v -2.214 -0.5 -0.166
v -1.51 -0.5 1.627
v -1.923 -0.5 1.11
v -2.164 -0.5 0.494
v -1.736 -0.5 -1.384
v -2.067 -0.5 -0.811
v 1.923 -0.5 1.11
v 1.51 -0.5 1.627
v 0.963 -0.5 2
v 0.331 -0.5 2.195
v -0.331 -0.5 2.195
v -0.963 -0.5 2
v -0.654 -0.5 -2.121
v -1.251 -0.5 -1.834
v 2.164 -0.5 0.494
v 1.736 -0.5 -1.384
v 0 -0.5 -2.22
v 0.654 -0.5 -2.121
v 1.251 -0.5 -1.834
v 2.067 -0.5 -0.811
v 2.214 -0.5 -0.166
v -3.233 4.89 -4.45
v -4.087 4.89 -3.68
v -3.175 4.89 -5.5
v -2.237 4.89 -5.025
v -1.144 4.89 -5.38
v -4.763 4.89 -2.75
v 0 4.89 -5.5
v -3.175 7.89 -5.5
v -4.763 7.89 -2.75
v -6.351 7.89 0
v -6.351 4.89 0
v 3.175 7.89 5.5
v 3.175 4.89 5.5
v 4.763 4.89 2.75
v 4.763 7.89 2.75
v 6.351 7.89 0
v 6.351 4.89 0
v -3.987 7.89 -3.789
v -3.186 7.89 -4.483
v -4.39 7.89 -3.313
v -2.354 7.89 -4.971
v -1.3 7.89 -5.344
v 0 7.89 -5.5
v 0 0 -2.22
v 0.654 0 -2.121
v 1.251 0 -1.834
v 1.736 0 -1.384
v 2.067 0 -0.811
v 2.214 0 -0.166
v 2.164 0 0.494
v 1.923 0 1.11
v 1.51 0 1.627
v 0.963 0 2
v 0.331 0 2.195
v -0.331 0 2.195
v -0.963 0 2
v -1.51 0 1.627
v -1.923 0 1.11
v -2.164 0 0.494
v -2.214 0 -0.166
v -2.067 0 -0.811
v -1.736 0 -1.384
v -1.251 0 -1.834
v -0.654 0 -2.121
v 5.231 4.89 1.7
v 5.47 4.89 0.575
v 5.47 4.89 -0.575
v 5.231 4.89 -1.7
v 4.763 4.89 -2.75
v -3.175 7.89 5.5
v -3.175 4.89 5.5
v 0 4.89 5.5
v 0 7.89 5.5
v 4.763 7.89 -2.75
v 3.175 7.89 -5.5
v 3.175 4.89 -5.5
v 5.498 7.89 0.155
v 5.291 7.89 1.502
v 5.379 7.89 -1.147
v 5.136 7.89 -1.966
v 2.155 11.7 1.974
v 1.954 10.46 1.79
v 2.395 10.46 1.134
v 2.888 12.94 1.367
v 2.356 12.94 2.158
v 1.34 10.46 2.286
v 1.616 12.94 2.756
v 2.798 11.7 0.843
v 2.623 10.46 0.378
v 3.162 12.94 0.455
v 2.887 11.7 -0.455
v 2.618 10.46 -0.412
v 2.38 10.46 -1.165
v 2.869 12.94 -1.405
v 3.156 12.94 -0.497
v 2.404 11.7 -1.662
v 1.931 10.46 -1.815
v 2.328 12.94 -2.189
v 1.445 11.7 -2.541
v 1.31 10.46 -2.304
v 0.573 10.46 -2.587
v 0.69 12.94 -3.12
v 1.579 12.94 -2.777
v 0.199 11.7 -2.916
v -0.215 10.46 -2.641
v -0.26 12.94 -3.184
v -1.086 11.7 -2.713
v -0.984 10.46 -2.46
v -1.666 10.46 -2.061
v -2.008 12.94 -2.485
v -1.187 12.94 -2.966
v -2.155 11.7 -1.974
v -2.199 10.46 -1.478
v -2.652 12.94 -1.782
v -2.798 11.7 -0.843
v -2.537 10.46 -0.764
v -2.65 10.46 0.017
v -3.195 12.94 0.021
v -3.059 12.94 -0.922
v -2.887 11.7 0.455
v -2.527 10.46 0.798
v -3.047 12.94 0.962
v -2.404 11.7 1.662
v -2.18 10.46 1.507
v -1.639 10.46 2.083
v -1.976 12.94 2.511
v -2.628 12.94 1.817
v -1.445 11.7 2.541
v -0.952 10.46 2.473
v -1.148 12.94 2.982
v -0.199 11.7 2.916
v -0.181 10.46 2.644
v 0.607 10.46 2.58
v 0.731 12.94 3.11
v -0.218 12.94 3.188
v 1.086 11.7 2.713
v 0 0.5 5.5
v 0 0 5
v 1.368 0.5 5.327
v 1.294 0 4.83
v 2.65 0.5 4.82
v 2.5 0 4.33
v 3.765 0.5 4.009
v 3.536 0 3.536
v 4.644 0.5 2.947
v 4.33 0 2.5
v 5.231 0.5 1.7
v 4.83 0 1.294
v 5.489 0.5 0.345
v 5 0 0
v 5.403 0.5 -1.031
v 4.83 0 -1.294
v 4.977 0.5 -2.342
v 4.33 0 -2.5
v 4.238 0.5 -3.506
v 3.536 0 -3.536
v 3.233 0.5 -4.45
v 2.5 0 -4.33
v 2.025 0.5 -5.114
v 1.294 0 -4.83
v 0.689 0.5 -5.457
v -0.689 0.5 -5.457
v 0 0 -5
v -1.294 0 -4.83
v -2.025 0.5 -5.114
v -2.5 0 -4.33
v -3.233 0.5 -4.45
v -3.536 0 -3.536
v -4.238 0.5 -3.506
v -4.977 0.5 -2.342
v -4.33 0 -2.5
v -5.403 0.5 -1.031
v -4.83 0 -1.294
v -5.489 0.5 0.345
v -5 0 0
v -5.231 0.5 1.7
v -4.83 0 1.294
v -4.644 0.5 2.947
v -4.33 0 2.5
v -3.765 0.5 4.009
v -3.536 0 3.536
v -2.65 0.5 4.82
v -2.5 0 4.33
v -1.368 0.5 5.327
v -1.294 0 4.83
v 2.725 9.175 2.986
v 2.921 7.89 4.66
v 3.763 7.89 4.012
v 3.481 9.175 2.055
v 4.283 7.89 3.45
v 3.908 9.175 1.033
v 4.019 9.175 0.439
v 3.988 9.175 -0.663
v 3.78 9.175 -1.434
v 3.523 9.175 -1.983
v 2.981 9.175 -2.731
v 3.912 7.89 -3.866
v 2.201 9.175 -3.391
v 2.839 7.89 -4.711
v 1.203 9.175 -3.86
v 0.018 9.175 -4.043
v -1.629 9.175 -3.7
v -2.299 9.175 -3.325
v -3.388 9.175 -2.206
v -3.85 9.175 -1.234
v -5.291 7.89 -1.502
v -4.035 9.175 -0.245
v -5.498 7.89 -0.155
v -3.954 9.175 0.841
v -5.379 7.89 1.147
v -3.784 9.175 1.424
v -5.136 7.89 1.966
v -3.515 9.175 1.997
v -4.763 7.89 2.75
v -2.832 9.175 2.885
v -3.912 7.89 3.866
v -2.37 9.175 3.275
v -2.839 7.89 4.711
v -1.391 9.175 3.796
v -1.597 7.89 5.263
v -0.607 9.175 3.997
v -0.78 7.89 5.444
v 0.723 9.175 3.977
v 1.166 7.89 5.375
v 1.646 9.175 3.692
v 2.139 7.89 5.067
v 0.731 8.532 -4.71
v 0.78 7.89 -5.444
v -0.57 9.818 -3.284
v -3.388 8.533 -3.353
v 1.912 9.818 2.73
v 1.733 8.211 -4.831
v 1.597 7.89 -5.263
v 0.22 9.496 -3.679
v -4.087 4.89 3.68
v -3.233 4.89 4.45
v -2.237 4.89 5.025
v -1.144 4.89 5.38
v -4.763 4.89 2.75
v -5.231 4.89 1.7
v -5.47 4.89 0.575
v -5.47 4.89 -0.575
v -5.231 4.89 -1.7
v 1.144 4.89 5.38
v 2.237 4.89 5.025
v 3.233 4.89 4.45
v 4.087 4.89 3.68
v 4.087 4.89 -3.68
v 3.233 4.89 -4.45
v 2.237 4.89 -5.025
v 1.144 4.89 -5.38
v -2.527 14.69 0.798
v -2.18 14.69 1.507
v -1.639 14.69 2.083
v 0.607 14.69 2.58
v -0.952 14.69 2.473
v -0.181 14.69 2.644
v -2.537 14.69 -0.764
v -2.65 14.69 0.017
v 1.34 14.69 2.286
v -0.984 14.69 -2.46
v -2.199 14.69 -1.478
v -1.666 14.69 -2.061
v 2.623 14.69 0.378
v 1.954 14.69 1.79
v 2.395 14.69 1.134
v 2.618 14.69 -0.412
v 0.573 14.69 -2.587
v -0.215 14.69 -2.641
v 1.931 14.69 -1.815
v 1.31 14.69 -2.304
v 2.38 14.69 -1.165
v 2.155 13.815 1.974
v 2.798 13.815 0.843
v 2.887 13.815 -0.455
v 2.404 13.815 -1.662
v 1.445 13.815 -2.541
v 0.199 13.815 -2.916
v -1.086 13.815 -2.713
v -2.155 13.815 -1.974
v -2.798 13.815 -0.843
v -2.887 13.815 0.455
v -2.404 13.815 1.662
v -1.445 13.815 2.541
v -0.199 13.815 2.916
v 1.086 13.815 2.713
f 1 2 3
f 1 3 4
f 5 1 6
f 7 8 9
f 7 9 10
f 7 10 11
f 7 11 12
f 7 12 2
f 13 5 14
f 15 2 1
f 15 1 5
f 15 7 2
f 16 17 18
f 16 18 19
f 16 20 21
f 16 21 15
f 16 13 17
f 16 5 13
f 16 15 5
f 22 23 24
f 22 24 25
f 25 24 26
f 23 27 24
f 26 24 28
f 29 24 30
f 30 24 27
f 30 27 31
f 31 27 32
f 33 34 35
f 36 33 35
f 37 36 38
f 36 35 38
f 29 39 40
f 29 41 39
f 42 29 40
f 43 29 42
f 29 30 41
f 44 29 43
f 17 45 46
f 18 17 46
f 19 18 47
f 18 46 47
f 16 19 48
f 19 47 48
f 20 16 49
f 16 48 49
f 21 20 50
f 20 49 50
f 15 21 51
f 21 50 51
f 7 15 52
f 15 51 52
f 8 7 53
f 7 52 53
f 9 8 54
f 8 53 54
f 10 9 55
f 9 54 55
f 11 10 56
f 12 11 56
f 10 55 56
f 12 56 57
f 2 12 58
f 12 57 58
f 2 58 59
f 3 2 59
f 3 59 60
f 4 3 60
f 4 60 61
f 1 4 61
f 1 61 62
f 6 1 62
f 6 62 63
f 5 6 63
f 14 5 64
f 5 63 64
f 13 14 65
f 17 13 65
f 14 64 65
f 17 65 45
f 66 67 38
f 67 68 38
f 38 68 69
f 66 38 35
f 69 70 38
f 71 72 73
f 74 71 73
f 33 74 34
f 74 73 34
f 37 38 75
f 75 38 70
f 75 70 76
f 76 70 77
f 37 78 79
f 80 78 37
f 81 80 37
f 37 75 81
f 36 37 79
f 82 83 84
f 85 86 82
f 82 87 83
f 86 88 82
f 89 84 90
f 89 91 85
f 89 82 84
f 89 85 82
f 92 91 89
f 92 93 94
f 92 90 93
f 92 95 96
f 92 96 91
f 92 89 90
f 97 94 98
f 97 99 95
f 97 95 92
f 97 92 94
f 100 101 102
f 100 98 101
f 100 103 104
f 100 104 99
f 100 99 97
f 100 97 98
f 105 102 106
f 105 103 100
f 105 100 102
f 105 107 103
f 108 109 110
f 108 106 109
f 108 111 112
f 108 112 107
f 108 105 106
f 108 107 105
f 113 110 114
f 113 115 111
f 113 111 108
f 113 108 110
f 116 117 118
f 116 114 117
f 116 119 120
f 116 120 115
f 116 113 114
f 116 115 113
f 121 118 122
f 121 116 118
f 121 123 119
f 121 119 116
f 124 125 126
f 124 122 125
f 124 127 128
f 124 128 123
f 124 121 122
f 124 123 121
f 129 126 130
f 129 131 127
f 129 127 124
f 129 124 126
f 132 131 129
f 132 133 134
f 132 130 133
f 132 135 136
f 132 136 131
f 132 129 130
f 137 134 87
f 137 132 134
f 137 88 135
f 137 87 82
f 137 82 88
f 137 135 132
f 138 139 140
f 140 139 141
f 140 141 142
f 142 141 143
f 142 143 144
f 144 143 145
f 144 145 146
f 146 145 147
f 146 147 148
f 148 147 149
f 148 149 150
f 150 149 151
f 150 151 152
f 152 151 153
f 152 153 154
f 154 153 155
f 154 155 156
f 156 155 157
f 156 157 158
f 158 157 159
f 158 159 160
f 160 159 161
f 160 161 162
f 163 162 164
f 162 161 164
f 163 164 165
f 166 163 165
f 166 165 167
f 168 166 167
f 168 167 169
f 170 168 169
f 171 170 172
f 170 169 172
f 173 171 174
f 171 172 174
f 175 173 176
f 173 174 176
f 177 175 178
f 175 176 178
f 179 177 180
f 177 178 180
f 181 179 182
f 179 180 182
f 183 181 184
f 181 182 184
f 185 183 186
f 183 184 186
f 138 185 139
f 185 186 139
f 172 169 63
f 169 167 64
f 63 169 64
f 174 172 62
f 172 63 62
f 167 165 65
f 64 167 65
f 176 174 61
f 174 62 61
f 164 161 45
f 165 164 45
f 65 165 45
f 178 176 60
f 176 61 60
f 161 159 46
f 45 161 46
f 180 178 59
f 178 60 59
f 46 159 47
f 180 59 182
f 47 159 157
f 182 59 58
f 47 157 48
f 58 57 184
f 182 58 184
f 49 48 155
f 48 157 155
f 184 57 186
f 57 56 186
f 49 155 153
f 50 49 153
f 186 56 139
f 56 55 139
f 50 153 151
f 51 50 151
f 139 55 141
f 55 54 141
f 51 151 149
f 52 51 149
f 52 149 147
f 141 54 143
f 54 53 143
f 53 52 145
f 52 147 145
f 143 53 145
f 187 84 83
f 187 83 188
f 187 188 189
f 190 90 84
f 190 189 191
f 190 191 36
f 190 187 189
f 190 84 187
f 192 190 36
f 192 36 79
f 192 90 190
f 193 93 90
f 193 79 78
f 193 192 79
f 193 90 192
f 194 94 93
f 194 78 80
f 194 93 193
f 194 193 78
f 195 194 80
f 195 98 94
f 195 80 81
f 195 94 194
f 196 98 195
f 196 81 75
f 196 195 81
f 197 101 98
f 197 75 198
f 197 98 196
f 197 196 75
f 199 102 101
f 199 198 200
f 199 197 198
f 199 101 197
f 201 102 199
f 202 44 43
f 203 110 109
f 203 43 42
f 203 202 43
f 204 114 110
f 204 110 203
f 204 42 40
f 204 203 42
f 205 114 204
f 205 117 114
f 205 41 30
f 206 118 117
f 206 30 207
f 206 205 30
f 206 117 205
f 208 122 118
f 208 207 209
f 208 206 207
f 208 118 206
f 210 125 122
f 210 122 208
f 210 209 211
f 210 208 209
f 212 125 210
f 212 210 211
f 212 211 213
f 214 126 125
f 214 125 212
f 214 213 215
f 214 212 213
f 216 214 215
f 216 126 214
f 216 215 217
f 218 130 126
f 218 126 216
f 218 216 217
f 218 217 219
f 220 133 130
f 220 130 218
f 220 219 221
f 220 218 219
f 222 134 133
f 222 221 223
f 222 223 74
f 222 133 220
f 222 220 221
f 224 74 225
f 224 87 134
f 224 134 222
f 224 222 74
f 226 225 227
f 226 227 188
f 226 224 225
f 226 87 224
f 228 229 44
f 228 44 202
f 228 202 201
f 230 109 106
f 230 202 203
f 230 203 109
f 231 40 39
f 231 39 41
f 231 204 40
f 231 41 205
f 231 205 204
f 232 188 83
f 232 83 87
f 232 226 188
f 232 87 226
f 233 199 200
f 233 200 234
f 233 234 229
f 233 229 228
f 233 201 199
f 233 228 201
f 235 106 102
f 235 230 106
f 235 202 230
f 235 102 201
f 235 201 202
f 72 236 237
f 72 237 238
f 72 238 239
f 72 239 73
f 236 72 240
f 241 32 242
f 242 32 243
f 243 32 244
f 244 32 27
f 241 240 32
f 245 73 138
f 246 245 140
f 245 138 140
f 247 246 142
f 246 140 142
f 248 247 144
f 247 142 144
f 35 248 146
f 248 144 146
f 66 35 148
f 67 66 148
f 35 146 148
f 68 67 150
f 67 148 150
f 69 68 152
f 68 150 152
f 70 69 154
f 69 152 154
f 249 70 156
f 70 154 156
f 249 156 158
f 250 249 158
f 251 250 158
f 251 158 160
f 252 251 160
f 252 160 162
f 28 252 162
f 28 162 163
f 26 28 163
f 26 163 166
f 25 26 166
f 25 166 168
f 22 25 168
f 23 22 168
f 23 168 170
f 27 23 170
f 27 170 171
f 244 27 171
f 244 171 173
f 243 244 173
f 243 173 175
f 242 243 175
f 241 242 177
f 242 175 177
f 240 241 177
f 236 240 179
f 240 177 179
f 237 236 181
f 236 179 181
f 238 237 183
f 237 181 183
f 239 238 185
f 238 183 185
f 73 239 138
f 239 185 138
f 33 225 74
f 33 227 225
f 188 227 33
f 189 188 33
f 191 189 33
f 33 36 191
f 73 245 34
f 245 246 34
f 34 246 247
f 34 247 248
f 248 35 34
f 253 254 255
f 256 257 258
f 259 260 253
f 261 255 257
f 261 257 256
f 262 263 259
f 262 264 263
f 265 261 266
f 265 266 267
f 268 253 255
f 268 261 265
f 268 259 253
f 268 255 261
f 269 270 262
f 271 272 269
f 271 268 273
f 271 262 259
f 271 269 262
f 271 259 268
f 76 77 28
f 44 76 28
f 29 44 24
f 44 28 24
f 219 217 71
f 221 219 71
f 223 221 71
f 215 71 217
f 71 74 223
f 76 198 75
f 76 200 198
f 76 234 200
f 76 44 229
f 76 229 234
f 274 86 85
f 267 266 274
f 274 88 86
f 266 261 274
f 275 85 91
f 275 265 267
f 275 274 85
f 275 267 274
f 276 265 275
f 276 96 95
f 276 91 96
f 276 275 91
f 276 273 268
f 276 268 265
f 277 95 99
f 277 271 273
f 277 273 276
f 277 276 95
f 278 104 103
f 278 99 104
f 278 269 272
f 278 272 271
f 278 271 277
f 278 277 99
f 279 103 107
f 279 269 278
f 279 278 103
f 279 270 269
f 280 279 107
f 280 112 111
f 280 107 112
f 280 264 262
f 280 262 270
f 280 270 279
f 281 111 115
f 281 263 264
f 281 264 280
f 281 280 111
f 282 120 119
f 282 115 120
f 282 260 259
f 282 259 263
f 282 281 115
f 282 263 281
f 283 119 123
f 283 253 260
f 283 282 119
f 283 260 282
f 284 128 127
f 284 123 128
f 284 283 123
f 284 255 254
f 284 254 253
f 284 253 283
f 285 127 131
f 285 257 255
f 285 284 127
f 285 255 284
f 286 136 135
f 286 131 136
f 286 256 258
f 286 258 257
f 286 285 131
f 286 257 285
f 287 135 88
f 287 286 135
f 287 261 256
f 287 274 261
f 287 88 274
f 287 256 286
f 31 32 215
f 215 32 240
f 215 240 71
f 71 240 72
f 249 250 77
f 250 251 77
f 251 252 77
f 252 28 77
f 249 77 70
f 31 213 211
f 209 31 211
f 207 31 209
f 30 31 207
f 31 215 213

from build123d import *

# Parameters (mm, degrees)
SKETCH1_R           = 5.5
BOSS_EXTRUDE1_DEPTH = 4.89
CHAMFER1_SIZE       = 0.5
SKETCH2_R           = 2.22
BOSS_EXTRUDE2_DEPTH = 0.5
BOSS_EXTRUDE3_DEPTH = 3
SKETCH4_R           = 2.65
BOSS_EXTRUDE4_DEPTH = 2.57
SKETCH8_R           = 3.195
SKETCH5_R           = 2.65


with BuildPart() as part:
    # Sketch1 → Boss-Extrude1 (new body)
    with BuildSketch(Plane(origin=(0, 0, 0), x_dir=(1, 0, 0), z_dir=(0, 1, 0))):
        with Locations(Location((0, 0, 0), (0, 0, 270))):
            Circle(SKETCH1_R)
    extrude(amount=BOSS_EXTRUDE1_DEPTH)

    # Chamfer1
    chamfer1_edges = [part.edges().sort_by_distance(p)[0] for p in [
        (0, 0, -5.5),
    ]]
    chamfer(chamfer1_edges, length=CHAMFER1_SIZE)

    # Sketch2 → Boss-Extrude2 (add)
    with BuildSketch(Plane(origin=(0, 0, 0), x_dir=(-1, 0, 0), z_dir=(0, -1, 0))):
        with Locations(Location((0, 0, 0), (0, 0, 90))):
            Circle(SKETCH2_R)
    extrude(amount=BOSS_EXTRUDE2_DEPTH)

    # Sketch3 → Boss-Extrude3 (add)
    with BuildSketch(Plane(origin=(0, 4.89, 0), x_dir=(1, 0, 0), z_dir=(0, 1, 0))):
        Polygon((-6.350852961, 0), (-3.175426481, -5.5), (3.175426481, -5.5), (6.350852961, 0), (3.175426481, 5.5), (-3.175426481, 5.5), align=None)
    extrude(amount=BOSS_EXTRUDE3_DEPTH)

    # Sketch4 → Boss-Extrude4 (add)
    with BuildSketch(Plane(origin=(0, 7.89, 0), x_dir=(1, 0, 0), z_dir=(0, 1, 0))):
        with Locations(Location((0, 0, 0), (0, 0, 270))):
            Circle(SKETCH4_R)
    extrude(amount=BOSS_EXTRUDE4_DEPTH)

    # Loft1: read off the stored shape, not the designer's step
    # Loft1: loft between two sections, ruled curve by curve
    loft1_from = [
        Edge.make_bspline([(2.920740302, 7.89, 4.660394413), (12.241529129, 7.89, -1.181086191), (6.400048524, 7.89, -10.501875018), (-2.920740302, 7.89, -4.660394413), (-12.241529129, 7.89, 1.181086191), (-6.400048524, 7.89, 10.501875018), (2.920740302, 7.89, 4.660394413)], [0, 0, 0, 0, 0.5, 0.5, 0.5, 1, 1, 1, 1], 3, [1, 0.333333333, 0.333333333, 1, 0.333333333, 0.333333333, 1]),
    ]
    loft1_to = [
        Edge.make_bspline([(1.954409761, 10.46, 1.789631942), (5.533673644, 10.46, -2.11918758), (1.624854122, 10.46, -5.698451464), (-1.954409761, 10.46, -1.789631942), (-5.533673644, 10.46, 2.11918758), (-1.624854122, 10.46, 5.698451464), (1.954409761, 10.46, 1.789631942)], [0, 0, 0, 0, 0.5, 0.5, 0.5, 1, 1, 1, 1], 3, [1, 0.333333333, 0.333333333, 1, 0.333333333, 0.333333333, 1]),
    ]
    loft1 = Solid(Shell([*[Face.make_surface_from_curves(loft1_from[k], loft1_to[k]) for k in range(1)], Face(Wire(loft1_from)), Face(Wire(loft1_to))]))
    add(loft1)

    # Sketch8 → section 1 of loft2
    with BuildSketch(Plane(origin=(0, 12.94, 0), x_dir=(1, 0, 0), z_dir=(0, 1, 0)), mode=Mode.PRIVATE) as loft2_s1:
        Circle(SKETCH8_R)
    # loft up to a face of the part (loft2)
    loft([Face(Wire([part.edges().sort_by_distance((-0.033300005, 10.46, -2.649790767))[0]])), loft2_s1.sketch])

    # Sketch5 → section 1 of loft3
    with BuildSketch(Plane(origin=(0, 14.69, 0), x_dir=(1, 0, 0), z_dir=(0, 1, 0)), mode=Mode.PRIVATE) as loft3_s1:
        Circle(SKETCH5_R)
    # loft up to a face of the part (loft3)
    loft([Face(Wire([part.edges().sort_by_distance((-0.040148497, 12.94, -3.194747736))[0]])), loft3_s1.sketch])


solid = part.part
